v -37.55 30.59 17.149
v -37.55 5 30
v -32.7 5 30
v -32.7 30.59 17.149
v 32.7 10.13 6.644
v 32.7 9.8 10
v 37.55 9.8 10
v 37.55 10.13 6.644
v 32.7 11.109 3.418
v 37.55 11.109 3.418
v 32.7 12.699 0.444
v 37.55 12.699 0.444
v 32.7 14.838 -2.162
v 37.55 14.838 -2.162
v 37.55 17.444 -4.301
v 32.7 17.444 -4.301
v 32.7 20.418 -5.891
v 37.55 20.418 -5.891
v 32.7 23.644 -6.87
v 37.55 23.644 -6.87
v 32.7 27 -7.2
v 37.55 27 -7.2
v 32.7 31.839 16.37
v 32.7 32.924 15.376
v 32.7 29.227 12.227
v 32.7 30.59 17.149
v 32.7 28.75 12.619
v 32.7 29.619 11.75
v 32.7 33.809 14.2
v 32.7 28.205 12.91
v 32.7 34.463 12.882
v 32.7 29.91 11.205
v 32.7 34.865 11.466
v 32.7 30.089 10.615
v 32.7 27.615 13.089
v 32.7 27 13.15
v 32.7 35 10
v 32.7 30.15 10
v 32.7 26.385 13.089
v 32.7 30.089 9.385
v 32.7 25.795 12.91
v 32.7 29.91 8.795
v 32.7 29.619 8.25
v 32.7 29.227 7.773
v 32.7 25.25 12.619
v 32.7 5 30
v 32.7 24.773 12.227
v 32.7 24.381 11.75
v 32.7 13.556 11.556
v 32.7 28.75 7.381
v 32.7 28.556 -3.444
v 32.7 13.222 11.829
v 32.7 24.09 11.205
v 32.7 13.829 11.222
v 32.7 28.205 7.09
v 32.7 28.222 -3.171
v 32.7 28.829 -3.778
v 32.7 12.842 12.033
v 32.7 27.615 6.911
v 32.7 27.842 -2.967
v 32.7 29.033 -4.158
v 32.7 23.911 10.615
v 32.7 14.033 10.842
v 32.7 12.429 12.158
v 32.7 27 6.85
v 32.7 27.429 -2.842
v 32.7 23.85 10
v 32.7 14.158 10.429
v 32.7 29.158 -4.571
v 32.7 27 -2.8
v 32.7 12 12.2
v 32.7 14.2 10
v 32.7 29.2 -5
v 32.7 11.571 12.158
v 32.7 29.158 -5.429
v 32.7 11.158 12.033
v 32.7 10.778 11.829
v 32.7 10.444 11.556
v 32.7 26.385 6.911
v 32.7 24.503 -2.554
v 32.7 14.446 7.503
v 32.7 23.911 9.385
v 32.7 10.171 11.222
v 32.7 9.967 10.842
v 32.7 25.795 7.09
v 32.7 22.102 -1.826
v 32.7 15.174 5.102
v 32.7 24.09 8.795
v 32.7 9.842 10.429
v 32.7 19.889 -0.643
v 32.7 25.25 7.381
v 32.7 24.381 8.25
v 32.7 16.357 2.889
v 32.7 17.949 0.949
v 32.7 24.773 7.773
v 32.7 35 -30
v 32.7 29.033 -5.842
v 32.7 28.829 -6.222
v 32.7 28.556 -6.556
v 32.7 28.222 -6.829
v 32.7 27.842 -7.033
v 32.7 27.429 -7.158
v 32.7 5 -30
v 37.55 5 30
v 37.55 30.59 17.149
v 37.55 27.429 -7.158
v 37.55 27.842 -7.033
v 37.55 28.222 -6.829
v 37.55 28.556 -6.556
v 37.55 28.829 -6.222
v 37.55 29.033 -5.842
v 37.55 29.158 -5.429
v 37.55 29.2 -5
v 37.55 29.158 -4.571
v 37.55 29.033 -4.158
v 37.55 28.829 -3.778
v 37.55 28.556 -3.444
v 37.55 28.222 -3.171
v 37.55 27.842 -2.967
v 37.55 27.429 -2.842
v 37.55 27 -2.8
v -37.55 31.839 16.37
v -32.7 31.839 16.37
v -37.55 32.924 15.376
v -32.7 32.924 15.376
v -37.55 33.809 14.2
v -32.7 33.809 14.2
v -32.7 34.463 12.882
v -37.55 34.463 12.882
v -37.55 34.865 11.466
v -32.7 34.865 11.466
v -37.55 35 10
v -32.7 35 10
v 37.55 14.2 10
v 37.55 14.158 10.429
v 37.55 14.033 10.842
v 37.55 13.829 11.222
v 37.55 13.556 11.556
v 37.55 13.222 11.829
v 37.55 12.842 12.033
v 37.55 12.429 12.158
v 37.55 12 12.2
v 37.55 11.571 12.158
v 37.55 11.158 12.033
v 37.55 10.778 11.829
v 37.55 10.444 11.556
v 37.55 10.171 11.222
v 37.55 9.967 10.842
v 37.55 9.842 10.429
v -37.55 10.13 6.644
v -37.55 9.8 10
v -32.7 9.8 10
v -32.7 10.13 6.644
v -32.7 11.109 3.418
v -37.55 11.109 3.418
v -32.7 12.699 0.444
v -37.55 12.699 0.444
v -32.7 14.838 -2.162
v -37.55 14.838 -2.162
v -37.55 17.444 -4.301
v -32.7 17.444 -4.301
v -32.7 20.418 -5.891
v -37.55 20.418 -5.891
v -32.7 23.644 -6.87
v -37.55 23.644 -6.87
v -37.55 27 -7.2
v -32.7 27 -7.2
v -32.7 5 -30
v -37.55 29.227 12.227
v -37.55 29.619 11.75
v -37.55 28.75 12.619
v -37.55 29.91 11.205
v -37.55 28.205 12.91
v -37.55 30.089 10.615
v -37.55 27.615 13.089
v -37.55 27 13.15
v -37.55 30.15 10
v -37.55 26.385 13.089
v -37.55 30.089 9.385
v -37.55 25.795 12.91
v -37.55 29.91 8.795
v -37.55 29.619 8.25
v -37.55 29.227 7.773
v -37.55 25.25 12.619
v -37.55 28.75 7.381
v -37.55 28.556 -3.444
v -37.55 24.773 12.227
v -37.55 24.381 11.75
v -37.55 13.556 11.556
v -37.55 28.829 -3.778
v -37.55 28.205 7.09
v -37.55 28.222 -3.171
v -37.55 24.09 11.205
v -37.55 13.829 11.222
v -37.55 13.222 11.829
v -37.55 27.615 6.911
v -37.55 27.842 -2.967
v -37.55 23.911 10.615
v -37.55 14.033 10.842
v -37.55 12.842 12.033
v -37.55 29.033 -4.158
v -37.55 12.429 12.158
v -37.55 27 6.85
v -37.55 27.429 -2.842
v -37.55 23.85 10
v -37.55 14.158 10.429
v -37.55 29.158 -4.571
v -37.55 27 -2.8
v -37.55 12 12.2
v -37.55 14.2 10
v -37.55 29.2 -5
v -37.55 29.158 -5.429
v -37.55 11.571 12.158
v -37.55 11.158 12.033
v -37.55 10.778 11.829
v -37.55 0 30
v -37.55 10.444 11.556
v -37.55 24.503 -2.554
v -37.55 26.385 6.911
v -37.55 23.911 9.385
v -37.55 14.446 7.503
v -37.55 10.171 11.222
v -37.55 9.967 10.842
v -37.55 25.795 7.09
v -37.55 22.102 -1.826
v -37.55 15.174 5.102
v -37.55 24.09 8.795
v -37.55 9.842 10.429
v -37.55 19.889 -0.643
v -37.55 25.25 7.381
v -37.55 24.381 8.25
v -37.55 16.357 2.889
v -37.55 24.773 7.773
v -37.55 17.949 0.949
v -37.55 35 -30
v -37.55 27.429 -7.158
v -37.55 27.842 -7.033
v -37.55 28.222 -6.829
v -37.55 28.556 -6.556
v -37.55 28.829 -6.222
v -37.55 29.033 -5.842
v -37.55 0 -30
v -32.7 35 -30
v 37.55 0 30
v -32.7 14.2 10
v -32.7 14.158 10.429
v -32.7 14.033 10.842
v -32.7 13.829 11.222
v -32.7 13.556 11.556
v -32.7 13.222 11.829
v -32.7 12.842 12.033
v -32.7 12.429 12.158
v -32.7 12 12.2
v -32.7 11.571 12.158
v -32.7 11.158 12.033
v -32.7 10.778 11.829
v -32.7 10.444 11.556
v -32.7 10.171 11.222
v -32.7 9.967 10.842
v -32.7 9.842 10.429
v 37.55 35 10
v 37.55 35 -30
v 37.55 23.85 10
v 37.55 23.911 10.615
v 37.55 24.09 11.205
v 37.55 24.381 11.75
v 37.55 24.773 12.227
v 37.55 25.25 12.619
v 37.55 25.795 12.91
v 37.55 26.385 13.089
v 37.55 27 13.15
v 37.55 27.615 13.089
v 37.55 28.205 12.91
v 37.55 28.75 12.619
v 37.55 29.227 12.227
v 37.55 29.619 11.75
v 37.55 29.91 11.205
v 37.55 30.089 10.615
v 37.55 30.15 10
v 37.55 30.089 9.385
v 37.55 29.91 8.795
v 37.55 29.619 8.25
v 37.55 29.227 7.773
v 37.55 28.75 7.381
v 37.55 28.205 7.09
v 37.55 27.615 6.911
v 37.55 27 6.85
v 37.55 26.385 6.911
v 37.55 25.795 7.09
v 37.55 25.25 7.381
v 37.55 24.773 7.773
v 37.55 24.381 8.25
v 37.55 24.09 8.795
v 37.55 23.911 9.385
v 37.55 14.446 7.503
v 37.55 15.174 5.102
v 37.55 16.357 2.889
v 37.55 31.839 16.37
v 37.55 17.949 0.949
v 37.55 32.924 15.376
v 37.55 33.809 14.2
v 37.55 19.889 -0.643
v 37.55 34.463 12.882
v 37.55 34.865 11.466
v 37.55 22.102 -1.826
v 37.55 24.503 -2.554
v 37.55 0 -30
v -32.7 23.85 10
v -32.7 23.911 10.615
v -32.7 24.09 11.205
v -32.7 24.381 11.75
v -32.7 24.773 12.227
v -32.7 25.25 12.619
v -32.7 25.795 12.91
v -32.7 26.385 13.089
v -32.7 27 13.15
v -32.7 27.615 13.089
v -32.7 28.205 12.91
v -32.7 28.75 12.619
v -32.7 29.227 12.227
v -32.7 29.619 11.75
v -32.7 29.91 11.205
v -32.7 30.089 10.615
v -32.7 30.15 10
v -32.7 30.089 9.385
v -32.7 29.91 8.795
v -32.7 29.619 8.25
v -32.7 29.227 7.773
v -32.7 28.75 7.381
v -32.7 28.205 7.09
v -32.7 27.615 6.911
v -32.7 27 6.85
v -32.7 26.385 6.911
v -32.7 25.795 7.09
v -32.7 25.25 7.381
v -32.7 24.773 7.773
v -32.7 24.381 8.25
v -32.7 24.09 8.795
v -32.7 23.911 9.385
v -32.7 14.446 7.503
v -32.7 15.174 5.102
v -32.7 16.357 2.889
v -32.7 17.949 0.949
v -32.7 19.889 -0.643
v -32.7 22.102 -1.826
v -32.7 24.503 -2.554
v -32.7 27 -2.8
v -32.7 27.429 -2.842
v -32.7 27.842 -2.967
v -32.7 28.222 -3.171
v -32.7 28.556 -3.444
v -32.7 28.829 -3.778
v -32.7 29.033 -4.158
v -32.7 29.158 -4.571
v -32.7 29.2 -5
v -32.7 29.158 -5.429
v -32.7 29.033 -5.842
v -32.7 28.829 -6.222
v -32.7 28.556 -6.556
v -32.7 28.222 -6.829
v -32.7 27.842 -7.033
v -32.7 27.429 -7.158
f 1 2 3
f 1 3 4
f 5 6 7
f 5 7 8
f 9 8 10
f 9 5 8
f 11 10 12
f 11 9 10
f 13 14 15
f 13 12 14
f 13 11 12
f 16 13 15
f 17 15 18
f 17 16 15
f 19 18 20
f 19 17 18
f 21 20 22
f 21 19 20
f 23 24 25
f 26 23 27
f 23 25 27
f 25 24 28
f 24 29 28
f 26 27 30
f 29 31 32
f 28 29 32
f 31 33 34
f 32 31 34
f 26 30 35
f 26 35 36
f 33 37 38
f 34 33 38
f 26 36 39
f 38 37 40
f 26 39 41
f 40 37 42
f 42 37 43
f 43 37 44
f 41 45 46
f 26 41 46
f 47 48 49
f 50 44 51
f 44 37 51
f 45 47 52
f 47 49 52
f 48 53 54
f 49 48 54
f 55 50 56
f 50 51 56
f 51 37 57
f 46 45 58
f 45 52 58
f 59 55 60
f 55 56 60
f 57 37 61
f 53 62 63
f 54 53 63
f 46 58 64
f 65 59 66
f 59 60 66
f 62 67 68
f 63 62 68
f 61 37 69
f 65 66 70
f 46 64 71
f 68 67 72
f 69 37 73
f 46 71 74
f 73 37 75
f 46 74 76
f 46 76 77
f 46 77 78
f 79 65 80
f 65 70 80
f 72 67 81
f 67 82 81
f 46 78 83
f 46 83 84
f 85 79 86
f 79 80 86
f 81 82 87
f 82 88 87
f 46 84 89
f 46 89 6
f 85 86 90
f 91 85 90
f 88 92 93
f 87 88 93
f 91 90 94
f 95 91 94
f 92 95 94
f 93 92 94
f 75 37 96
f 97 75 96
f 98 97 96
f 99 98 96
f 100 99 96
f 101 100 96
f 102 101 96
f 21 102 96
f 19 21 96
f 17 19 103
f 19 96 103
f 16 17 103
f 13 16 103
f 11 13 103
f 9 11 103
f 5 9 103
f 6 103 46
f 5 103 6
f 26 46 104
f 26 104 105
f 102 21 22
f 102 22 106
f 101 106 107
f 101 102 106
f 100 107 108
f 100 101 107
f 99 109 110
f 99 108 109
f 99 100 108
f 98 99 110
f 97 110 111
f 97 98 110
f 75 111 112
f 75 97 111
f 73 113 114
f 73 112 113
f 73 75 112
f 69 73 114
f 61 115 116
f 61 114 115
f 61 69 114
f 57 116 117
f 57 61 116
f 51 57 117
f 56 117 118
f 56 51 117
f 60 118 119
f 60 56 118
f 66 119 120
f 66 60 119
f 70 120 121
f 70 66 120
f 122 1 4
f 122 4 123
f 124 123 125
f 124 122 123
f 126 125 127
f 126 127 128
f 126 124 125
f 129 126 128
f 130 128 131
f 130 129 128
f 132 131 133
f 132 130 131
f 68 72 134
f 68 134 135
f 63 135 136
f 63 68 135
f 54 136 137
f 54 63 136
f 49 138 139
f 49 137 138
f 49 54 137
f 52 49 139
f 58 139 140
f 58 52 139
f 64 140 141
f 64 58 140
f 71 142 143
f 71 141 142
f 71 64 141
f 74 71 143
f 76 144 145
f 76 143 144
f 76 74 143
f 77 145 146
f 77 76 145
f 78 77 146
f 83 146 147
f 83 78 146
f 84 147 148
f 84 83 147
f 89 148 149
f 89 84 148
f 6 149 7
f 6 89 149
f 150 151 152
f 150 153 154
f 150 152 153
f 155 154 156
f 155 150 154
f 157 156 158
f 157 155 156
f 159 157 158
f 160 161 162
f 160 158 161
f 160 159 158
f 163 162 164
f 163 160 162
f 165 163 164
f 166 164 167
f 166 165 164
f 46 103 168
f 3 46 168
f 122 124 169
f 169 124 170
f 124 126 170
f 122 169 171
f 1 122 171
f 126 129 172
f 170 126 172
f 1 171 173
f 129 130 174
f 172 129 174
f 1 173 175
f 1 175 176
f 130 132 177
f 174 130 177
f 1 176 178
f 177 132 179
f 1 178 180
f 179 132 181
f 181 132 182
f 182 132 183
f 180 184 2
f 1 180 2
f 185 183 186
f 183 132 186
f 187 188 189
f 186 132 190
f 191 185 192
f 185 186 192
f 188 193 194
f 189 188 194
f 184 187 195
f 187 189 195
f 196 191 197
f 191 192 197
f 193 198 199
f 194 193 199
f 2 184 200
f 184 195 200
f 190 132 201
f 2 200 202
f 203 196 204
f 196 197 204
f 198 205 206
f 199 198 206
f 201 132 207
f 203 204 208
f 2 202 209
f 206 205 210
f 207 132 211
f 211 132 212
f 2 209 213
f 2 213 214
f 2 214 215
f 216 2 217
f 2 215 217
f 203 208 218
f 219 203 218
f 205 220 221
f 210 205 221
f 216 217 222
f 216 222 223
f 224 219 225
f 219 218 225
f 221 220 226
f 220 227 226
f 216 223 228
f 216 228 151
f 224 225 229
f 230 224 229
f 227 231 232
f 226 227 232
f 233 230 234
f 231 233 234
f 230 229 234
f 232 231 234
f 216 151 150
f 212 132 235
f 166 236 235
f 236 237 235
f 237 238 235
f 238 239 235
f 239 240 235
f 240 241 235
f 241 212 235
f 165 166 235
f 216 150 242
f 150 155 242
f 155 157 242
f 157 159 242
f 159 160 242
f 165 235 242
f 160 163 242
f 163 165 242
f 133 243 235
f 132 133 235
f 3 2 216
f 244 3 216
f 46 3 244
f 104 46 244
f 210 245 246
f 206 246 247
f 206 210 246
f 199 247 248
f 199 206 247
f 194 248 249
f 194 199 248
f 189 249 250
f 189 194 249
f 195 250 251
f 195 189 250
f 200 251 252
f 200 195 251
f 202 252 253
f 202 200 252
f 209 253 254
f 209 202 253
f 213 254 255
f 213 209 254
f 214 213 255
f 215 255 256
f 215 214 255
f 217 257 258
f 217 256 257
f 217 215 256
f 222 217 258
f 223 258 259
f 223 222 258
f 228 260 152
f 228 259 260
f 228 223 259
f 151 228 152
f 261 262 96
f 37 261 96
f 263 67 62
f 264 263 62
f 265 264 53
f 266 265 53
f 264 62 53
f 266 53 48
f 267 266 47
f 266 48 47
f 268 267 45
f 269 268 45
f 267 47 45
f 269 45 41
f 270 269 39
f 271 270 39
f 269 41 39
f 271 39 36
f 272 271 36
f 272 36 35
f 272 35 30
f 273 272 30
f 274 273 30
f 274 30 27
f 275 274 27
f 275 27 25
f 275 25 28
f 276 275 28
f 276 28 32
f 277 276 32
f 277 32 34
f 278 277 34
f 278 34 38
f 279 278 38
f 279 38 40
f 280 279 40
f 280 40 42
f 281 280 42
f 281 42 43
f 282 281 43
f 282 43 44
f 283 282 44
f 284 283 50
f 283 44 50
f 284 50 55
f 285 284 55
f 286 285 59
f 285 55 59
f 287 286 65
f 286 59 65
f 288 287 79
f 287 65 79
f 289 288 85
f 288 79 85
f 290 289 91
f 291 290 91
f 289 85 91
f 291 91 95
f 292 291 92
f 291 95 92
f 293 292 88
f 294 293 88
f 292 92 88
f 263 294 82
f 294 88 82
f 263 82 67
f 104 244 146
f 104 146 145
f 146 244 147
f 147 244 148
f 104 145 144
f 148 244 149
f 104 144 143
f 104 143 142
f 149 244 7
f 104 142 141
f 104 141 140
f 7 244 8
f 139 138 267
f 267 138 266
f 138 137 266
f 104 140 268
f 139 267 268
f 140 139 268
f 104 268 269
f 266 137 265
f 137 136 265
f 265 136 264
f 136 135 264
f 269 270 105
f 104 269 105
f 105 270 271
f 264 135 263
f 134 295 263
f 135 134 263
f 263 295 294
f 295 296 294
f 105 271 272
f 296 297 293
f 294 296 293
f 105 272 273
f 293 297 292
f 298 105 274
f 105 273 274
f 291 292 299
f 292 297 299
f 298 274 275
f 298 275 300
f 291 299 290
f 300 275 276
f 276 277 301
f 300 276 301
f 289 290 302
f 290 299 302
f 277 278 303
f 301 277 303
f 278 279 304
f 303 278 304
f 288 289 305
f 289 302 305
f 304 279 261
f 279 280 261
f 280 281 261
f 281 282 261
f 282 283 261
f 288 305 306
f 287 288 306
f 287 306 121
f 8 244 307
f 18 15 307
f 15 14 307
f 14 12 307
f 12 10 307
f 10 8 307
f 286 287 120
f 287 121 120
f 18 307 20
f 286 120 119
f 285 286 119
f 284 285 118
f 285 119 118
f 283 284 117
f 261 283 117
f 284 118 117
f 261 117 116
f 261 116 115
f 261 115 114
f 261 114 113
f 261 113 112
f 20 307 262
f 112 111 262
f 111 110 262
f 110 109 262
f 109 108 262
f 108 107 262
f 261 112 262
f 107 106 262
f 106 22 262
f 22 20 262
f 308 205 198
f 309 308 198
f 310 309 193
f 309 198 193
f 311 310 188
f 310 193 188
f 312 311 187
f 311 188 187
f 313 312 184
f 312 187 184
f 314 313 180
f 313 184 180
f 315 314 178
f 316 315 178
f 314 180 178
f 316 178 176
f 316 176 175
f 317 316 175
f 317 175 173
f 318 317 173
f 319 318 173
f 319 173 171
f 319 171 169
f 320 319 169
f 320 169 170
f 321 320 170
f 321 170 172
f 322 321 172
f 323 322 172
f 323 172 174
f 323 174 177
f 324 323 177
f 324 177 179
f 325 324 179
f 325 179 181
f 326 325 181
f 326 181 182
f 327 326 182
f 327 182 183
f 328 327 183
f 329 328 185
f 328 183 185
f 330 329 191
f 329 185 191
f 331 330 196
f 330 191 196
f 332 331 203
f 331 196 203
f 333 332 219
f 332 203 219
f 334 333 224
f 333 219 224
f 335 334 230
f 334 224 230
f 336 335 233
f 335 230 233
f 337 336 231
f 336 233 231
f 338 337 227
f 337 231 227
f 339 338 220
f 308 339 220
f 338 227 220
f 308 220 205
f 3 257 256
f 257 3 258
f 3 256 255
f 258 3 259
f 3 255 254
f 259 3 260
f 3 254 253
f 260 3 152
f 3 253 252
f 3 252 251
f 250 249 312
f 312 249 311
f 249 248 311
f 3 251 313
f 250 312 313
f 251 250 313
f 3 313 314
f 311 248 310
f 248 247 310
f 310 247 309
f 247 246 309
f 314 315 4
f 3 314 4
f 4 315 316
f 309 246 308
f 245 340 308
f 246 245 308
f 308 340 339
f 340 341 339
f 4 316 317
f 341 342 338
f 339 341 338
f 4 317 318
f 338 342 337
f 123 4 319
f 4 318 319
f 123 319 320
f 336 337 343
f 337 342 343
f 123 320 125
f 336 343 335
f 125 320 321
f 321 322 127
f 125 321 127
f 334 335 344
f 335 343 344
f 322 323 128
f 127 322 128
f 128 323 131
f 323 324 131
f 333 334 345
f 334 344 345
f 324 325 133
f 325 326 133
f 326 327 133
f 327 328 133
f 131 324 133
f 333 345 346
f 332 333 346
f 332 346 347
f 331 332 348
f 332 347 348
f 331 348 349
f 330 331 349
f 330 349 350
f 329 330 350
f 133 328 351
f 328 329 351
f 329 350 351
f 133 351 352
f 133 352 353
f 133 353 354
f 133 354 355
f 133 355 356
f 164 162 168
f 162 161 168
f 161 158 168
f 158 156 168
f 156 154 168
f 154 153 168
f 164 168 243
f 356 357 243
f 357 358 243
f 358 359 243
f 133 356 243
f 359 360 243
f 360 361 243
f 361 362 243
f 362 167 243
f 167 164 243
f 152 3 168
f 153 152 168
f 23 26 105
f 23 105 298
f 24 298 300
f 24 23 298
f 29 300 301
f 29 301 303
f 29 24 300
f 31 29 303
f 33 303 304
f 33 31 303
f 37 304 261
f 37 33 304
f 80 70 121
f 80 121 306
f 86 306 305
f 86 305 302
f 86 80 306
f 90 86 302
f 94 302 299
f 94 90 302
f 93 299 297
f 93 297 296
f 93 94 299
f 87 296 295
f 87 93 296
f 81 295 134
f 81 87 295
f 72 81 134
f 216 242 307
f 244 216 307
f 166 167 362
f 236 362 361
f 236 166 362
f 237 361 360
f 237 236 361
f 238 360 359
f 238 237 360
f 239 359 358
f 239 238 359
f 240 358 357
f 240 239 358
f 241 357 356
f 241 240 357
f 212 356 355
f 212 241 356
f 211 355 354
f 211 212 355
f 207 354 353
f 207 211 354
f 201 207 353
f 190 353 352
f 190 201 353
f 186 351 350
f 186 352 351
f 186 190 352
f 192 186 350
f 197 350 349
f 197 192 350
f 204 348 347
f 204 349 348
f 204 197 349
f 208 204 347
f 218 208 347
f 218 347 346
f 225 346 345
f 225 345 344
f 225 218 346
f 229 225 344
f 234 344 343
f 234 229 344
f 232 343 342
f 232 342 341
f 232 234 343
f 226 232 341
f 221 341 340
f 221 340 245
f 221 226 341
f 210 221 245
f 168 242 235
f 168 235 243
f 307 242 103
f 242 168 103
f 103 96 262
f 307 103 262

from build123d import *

# Parameters (mm, degrees)
EXTRUDE_1_DEPTH      = 30
EXTRUDE_1_DEPTH_BACK = 30
SKETCH_3_R           = 3.15
CUT_EXTRUDE_1_DEPTH  = 89.119294142


with BuildPart() as part:
    # 草图1 → 凸台-拉伸1 (new, two sides: drawn at the far end of the back side and taken through both)
    with BuildSketch(Plane.XY.offset(-EXTRUDE_1_DEPTH_BACK)):
        Polygon((-37.55, 0), (37.55, 0), (37.55, 35), (32.7, 35), (32.7, 5), (-32.7, 5), (-32.7, 35), (-37.55, 35), align=None)
    extrude(amount=EXTRUDE_1_DEPTH + EXTRUDE_1_DEPTH_BACK)

    # 草图3 → 切除-拉伸1 (cut, through all)
    with BuildSketch(Plane.ZY.offset(37.55)):
        with BuildLine():
            ThreePointArc((10, 9.8), (12.2, 12), (10, 14.2))
            ThreePointArc((10, 14.2), (0.949033201, 17.949033201), (-2.8, 27))
            ThreePointArc((-2.8, 27), (-5, 29.2), (-7.2, 27))
            ThreePointArc((-7.2, 27), (-2.162236636, 14.837763364), (10, 9.8))
        make_face()
        with Locations((10, 27)):
            Circle(SKETCH_3_R)
        with BuildLine():
            Line((17.149177618, 30.590161471), (30, 5))
            Line((30, 5), (30, 35))
            Line((30, 35), (10, 35))
            ThreePointArc((10, 35), (14.199923108, 33.808865242), (17.149177618, 30.590161471))
        make_face()
    extrude(amount=-CUT_EXTRUDE_1_DEPTH, mode=Mode.SUBTRACT)


solid = part.part
